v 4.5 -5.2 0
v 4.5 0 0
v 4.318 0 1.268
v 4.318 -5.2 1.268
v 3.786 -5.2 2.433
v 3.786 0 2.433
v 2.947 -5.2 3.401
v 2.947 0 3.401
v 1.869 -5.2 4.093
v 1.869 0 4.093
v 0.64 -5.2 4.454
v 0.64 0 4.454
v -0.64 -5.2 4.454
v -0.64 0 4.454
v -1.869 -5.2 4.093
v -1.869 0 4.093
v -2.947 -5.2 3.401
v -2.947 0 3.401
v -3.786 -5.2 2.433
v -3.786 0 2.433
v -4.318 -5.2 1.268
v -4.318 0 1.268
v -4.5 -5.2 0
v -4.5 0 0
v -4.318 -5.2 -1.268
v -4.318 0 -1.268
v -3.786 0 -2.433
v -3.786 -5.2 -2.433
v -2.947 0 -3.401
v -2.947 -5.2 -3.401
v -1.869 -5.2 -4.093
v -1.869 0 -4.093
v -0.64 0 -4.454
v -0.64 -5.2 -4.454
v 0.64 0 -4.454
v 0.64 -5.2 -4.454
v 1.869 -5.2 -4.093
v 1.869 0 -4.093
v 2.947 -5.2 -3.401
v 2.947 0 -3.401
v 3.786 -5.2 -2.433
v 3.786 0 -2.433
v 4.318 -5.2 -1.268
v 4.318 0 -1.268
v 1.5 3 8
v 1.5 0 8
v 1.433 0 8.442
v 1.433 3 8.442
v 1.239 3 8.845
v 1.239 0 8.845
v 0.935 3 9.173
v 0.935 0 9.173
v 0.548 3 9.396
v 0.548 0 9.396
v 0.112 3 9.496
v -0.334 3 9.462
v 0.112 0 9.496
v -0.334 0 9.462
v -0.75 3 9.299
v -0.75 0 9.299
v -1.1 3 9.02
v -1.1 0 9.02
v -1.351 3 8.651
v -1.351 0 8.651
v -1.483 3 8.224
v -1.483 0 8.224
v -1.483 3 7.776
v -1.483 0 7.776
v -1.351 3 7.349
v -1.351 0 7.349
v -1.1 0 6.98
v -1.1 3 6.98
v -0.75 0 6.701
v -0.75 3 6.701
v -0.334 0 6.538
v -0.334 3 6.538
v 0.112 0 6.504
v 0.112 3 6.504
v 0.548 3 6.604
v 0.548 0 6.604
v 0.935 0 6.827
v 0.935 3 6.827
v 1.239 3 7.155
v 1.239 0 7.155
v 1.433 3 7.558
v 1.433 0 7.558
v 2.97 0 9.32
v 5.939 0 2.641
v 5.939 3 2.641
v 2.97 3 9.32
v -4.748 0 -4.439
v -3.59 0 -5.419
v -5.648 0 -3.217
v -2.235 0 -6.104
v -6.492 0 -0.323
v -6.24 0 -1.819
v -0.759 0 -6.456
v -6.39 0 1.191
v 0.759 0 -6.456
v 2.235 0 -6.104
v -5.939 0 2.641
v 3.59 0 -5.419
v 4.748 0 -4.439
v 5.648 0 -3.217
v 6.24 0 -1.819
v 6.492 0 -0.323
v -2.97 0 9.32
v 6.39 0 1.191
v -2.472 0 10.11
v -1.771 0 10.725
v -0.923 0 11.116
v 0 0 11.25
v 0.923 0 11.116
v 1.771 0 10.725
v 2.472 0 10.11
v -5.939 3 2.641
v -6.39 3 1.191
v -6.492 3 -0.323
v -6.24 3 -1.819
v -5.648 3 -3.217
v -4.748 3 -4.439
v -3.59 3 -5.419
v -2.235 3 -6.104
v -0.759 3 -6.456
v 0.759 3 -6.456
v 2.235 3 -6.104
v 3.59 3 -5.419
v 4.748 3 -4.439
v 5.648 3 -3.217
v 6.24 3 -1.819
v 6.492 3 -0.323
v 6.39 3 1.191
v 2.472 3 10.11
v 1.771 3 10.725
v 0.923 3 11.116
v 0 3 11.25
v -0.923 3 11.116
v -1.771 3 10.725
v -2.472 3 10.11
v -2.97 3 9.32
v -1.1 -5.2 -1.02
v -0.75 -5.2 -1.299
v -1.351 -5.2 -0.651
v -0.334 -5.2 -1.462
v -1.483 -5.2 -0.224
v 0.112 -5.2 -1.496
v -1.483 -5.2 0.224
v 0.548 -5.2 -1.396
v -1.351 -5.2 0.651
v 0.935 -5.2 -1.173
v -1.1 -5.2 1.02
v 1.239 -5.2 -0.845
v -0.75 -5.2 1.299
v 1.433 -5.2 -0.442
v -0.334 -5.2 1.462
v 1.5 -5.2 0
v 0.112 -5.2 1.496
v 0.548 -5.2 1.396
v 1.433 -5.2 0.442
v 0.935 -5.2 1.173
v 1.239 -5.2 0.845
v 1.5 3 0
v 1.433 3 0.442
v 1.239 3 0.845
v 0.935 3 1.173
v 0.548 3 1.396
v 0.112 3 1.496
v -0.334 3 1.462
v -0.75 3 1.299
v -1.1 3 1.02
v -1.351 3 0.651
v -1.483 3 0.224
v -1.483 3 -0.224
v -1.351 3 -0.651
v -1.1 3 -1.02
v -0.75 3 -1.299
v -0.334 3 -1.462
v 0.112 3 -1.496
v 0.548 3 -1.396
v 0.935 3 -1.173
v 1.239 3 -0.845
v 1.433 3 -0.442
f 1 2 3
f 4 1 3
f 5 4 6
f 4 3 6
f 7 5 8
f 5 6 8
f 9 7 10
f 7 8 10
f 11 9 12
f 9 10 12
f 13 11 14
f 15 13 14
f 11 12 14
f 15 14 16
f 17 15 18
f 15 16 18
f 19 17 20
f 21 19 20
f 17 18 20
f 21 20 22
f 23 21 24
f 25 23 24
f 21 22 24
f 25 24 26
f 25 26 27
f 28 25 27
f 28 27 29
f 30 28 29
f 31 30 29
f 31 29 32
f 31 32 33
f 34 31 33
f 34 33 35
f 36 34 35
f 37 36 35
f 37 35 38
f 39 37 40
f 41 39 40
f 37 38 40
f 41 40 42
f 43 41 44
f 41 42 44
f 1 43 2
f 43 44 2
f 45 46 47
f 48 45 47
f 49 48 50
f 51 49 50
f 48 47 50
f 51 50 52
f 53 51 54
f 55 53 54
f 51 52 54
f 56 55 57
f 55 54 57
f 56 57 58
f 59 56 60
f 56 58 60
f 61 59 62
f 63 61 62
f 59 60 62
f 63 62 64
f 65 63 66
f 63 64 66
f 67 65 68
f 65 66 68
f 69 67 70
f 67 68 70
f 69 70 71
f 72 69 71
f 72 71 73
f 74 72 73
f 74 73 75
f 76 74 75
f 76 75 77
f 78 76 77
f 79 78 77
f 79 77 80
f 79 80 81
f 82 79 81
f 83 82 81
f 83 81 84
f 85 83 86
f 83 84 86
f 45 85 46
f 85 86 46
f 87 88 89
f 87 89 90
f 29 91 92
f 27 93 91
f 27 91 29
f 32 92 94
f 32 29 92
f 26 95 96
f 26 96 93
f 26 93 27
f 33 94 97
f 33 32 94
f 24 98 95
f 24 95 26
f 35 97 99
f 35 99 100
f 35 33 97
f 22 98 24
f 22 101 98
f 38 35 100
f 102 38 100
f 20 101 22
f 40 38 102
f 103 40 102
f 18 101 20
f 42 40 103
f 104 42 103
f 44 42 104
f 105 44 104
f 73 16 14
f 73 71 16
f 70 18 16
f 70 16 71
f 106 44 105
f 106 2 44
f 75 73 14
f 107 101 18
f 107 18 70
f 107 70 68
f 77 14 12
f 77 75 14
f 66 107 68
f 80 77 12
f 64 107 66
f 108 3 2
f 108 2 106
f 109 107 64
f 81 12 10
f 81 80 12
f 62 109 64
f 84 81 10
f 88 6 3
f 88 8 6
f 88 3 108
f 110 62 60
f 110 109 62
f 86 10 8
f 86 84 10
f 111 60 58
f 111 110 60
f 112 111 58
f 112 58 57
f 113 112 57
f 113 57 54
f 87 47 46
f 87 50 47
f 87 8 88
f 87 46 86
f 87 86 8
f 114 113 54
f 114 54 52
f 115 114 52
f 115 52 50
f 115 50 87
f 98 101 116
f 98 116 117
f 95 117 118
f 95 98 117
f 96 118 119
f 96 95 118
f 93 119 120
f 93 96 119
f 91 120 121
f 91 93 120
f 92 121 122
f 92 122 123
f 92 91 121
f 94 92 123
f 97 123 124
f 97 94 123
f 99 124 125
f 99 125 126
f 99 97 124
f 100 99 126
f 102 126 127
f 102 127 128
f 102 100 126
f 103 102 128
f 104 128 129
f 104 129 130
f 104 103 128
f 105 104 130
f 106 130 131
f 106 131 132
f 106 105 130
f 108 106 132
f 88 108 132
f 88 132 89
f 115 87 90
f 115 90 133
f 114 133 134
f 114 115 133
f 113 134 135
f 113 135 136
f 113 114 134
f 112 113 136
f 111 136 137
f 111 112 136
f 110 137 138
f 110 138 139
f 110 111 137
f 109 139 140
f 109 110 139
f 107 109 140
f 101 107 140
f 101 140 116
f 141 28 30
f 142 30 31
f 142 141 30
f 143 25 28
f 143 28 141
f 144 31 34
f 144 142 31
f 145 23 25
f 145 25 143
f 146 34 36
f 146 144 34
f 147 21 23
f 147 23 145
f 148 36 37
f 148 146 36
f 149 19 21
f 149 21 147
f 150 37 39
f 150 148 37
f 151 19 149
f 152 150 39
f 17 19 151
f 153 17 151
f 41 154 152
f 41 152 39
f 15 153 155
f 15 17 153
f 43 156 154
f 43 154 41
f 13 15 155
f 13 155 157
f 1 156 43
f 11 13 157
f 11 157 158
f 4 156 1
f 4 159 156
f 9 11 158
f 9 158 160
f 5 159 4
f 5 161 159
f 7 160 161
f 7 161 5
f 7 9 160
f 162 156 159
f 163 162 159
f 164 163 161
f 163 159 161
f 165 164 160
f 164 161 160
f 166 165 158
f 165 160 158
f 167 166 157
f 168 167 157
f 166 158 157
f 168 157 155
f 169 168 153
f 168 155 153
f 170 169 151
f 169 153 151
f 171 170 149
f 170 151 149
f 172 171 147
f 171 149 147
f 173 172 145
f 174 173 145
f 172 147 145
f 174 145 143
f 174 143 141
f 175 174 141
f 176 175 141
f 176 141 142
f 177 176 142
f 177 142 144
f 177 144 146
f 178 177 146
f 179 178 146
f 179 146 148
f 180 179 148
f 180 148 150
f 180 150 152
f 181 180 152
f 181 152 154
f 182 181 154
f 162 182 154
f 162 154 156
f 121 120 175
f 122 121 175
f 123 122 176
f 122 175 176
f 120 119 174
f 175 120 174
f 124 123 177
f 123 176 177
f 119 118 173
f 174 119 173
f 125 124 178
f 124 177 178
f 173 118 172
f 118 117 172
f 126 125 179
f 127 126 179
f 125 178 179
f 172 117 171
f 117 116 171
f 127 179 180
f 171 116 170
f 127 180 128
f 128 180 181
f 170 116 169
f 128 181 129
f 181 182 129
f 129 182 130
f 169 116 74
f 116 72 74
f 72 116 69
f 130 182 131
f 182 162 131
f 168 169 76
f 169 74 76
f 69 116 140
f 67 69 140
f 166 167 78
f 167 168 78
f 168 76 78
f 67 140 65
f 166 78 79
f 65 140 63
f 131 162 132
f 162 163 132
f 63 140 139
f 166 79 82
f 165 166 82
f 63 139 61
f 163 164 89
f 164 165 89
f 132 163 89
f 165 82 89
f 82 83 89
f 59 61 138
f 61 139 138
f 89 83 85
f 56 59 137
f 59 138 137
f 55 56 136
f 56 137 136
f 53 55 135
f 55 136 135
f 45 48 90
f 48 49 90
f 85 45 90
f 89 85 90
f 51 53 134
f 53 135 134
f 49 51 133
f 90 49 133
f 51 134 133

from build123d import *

# Parameters (mm, degrees)
F0_R     = 1.5
F1_DEPTH = 3
F2_R     = 4.5
F3_DEPTH = 5.2
F4_R     = 1.5
F5_DEPTH = 20


with BuildPart() as f1:
    # F0 (on Front) → F1 (new body)
    with BuildSketch(Plane.XZ):
        with BuildLine():
            Line((5.9394528039, 2.640625), (2.9697264019, 9.3203125))
            ThreePointArc((2.9697264019, 9.3203125), (0, 11.25), (-2.9697264019, 9.3203125))
            Line((-2.9697264019, 9.3203125), (-5.9394528039, 2.640625))
            ThreePointArc((-5.9394528039, 2.640625), (0, -6.5), (5.9394528039, 2.640625))
        make_face()
        with Locations((0, 8)):
            Circle(F0_R, mode=Mode.SUBTRACT)
    extrude(amount=-F1_DEPTH)

    # F2 (on face) → F3 (join)
    with BuildSketch(Plane.XZ):
        Circle(F2_R)
    extrude(amount=F3_DEPTH)

    # F4 (on face) → F5 (cut)
    with BuildSketch(Plane.XZ.offset(5.2)):
        Circle(F4_R)
    extrude(amount=-F5_DEPTH, mode=Mode.SUBTRACT)


solid = f1.part
